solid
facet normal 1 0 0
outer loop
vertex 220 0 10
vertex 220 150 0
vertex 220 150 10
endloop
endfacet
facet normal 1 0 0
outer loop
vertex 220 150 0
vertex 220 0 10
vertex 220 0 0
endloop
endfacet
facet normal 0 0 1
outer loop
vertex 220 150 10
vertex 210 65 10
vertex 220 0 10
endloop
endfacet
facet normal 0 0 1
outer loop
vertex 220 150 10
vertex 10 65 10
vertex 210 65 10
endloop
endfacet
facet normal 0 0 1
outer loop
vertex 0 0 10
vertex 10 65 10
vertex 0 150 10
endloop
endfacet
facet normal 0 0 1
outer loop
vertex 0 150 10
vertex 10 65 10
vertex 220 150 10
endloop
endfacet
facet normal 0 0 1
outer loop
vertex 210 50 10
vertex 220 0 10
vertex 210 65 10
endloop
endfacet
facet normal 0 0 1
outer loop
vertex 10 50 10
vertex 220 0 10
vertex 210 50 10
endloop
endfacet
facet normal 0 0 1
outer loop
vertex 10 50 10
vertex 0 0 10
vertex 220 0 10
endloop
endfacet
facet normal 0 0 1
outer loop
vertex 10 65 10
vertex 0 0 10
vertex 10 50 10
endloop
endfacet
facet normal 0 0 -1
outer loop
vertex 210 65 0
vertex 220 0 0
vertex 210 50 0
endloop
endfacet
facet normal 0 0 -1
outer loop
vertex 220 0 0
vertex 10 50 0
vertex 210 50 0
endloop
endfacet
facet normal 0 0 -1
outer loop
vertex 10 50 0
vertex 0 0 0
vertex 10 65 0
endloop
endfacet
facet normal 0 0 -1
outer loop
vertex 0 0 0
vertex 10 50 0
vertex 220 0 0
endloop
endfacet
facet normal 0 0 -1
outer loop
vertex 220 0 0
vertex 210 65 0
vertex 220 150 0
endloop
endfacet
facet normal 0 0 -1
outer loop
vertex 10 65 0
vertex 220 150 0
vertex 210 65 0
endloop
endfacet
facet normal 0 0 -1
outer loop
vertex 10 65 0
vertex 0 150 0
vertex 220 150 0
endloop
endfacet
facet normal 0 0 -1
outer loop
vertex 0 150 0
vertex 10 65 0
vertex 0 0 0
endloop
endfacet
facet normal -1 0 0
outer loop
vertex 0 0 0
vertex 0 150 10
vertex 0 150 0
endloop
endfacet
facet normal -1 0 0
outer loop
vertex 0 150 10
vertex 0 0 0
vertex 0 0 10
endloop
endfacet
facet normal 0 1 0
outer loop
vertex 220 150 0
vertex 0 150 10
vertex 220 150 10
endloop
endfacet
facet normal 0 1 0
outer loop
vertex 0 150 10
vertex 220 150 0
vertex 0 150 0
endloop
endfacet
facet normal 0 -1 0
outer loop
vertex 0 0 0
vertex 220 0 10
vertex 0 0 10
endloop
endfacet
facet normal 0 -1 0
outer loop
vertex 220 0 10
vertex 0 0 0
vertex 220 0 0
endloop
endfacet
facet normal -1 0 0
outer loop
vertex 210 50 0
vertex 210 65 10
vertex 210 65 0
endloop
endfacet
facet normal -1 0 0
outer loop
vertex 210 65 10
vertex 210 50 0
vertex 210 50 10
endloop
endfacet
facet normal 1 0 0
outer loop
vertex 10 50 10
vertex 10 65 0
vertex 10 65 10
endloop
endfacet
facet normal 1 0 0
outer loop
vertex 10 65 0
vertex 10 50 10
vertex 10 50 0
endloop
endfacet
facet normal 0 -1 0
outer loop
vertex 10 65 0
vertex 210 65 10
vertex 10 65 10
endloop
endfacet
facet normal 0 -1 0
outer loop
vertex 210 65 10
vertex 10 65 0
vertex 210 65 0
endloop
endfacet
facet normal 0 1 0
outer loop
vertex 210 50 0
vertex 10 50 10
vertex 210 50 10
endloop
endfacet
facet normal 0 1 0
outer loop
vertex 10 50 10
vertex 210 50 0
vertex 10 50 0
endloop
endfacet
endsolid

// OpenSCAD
difference()
{
  cube([220,150,10]);
  translate([10,50,-1]) cube([200,15,15]);
}
